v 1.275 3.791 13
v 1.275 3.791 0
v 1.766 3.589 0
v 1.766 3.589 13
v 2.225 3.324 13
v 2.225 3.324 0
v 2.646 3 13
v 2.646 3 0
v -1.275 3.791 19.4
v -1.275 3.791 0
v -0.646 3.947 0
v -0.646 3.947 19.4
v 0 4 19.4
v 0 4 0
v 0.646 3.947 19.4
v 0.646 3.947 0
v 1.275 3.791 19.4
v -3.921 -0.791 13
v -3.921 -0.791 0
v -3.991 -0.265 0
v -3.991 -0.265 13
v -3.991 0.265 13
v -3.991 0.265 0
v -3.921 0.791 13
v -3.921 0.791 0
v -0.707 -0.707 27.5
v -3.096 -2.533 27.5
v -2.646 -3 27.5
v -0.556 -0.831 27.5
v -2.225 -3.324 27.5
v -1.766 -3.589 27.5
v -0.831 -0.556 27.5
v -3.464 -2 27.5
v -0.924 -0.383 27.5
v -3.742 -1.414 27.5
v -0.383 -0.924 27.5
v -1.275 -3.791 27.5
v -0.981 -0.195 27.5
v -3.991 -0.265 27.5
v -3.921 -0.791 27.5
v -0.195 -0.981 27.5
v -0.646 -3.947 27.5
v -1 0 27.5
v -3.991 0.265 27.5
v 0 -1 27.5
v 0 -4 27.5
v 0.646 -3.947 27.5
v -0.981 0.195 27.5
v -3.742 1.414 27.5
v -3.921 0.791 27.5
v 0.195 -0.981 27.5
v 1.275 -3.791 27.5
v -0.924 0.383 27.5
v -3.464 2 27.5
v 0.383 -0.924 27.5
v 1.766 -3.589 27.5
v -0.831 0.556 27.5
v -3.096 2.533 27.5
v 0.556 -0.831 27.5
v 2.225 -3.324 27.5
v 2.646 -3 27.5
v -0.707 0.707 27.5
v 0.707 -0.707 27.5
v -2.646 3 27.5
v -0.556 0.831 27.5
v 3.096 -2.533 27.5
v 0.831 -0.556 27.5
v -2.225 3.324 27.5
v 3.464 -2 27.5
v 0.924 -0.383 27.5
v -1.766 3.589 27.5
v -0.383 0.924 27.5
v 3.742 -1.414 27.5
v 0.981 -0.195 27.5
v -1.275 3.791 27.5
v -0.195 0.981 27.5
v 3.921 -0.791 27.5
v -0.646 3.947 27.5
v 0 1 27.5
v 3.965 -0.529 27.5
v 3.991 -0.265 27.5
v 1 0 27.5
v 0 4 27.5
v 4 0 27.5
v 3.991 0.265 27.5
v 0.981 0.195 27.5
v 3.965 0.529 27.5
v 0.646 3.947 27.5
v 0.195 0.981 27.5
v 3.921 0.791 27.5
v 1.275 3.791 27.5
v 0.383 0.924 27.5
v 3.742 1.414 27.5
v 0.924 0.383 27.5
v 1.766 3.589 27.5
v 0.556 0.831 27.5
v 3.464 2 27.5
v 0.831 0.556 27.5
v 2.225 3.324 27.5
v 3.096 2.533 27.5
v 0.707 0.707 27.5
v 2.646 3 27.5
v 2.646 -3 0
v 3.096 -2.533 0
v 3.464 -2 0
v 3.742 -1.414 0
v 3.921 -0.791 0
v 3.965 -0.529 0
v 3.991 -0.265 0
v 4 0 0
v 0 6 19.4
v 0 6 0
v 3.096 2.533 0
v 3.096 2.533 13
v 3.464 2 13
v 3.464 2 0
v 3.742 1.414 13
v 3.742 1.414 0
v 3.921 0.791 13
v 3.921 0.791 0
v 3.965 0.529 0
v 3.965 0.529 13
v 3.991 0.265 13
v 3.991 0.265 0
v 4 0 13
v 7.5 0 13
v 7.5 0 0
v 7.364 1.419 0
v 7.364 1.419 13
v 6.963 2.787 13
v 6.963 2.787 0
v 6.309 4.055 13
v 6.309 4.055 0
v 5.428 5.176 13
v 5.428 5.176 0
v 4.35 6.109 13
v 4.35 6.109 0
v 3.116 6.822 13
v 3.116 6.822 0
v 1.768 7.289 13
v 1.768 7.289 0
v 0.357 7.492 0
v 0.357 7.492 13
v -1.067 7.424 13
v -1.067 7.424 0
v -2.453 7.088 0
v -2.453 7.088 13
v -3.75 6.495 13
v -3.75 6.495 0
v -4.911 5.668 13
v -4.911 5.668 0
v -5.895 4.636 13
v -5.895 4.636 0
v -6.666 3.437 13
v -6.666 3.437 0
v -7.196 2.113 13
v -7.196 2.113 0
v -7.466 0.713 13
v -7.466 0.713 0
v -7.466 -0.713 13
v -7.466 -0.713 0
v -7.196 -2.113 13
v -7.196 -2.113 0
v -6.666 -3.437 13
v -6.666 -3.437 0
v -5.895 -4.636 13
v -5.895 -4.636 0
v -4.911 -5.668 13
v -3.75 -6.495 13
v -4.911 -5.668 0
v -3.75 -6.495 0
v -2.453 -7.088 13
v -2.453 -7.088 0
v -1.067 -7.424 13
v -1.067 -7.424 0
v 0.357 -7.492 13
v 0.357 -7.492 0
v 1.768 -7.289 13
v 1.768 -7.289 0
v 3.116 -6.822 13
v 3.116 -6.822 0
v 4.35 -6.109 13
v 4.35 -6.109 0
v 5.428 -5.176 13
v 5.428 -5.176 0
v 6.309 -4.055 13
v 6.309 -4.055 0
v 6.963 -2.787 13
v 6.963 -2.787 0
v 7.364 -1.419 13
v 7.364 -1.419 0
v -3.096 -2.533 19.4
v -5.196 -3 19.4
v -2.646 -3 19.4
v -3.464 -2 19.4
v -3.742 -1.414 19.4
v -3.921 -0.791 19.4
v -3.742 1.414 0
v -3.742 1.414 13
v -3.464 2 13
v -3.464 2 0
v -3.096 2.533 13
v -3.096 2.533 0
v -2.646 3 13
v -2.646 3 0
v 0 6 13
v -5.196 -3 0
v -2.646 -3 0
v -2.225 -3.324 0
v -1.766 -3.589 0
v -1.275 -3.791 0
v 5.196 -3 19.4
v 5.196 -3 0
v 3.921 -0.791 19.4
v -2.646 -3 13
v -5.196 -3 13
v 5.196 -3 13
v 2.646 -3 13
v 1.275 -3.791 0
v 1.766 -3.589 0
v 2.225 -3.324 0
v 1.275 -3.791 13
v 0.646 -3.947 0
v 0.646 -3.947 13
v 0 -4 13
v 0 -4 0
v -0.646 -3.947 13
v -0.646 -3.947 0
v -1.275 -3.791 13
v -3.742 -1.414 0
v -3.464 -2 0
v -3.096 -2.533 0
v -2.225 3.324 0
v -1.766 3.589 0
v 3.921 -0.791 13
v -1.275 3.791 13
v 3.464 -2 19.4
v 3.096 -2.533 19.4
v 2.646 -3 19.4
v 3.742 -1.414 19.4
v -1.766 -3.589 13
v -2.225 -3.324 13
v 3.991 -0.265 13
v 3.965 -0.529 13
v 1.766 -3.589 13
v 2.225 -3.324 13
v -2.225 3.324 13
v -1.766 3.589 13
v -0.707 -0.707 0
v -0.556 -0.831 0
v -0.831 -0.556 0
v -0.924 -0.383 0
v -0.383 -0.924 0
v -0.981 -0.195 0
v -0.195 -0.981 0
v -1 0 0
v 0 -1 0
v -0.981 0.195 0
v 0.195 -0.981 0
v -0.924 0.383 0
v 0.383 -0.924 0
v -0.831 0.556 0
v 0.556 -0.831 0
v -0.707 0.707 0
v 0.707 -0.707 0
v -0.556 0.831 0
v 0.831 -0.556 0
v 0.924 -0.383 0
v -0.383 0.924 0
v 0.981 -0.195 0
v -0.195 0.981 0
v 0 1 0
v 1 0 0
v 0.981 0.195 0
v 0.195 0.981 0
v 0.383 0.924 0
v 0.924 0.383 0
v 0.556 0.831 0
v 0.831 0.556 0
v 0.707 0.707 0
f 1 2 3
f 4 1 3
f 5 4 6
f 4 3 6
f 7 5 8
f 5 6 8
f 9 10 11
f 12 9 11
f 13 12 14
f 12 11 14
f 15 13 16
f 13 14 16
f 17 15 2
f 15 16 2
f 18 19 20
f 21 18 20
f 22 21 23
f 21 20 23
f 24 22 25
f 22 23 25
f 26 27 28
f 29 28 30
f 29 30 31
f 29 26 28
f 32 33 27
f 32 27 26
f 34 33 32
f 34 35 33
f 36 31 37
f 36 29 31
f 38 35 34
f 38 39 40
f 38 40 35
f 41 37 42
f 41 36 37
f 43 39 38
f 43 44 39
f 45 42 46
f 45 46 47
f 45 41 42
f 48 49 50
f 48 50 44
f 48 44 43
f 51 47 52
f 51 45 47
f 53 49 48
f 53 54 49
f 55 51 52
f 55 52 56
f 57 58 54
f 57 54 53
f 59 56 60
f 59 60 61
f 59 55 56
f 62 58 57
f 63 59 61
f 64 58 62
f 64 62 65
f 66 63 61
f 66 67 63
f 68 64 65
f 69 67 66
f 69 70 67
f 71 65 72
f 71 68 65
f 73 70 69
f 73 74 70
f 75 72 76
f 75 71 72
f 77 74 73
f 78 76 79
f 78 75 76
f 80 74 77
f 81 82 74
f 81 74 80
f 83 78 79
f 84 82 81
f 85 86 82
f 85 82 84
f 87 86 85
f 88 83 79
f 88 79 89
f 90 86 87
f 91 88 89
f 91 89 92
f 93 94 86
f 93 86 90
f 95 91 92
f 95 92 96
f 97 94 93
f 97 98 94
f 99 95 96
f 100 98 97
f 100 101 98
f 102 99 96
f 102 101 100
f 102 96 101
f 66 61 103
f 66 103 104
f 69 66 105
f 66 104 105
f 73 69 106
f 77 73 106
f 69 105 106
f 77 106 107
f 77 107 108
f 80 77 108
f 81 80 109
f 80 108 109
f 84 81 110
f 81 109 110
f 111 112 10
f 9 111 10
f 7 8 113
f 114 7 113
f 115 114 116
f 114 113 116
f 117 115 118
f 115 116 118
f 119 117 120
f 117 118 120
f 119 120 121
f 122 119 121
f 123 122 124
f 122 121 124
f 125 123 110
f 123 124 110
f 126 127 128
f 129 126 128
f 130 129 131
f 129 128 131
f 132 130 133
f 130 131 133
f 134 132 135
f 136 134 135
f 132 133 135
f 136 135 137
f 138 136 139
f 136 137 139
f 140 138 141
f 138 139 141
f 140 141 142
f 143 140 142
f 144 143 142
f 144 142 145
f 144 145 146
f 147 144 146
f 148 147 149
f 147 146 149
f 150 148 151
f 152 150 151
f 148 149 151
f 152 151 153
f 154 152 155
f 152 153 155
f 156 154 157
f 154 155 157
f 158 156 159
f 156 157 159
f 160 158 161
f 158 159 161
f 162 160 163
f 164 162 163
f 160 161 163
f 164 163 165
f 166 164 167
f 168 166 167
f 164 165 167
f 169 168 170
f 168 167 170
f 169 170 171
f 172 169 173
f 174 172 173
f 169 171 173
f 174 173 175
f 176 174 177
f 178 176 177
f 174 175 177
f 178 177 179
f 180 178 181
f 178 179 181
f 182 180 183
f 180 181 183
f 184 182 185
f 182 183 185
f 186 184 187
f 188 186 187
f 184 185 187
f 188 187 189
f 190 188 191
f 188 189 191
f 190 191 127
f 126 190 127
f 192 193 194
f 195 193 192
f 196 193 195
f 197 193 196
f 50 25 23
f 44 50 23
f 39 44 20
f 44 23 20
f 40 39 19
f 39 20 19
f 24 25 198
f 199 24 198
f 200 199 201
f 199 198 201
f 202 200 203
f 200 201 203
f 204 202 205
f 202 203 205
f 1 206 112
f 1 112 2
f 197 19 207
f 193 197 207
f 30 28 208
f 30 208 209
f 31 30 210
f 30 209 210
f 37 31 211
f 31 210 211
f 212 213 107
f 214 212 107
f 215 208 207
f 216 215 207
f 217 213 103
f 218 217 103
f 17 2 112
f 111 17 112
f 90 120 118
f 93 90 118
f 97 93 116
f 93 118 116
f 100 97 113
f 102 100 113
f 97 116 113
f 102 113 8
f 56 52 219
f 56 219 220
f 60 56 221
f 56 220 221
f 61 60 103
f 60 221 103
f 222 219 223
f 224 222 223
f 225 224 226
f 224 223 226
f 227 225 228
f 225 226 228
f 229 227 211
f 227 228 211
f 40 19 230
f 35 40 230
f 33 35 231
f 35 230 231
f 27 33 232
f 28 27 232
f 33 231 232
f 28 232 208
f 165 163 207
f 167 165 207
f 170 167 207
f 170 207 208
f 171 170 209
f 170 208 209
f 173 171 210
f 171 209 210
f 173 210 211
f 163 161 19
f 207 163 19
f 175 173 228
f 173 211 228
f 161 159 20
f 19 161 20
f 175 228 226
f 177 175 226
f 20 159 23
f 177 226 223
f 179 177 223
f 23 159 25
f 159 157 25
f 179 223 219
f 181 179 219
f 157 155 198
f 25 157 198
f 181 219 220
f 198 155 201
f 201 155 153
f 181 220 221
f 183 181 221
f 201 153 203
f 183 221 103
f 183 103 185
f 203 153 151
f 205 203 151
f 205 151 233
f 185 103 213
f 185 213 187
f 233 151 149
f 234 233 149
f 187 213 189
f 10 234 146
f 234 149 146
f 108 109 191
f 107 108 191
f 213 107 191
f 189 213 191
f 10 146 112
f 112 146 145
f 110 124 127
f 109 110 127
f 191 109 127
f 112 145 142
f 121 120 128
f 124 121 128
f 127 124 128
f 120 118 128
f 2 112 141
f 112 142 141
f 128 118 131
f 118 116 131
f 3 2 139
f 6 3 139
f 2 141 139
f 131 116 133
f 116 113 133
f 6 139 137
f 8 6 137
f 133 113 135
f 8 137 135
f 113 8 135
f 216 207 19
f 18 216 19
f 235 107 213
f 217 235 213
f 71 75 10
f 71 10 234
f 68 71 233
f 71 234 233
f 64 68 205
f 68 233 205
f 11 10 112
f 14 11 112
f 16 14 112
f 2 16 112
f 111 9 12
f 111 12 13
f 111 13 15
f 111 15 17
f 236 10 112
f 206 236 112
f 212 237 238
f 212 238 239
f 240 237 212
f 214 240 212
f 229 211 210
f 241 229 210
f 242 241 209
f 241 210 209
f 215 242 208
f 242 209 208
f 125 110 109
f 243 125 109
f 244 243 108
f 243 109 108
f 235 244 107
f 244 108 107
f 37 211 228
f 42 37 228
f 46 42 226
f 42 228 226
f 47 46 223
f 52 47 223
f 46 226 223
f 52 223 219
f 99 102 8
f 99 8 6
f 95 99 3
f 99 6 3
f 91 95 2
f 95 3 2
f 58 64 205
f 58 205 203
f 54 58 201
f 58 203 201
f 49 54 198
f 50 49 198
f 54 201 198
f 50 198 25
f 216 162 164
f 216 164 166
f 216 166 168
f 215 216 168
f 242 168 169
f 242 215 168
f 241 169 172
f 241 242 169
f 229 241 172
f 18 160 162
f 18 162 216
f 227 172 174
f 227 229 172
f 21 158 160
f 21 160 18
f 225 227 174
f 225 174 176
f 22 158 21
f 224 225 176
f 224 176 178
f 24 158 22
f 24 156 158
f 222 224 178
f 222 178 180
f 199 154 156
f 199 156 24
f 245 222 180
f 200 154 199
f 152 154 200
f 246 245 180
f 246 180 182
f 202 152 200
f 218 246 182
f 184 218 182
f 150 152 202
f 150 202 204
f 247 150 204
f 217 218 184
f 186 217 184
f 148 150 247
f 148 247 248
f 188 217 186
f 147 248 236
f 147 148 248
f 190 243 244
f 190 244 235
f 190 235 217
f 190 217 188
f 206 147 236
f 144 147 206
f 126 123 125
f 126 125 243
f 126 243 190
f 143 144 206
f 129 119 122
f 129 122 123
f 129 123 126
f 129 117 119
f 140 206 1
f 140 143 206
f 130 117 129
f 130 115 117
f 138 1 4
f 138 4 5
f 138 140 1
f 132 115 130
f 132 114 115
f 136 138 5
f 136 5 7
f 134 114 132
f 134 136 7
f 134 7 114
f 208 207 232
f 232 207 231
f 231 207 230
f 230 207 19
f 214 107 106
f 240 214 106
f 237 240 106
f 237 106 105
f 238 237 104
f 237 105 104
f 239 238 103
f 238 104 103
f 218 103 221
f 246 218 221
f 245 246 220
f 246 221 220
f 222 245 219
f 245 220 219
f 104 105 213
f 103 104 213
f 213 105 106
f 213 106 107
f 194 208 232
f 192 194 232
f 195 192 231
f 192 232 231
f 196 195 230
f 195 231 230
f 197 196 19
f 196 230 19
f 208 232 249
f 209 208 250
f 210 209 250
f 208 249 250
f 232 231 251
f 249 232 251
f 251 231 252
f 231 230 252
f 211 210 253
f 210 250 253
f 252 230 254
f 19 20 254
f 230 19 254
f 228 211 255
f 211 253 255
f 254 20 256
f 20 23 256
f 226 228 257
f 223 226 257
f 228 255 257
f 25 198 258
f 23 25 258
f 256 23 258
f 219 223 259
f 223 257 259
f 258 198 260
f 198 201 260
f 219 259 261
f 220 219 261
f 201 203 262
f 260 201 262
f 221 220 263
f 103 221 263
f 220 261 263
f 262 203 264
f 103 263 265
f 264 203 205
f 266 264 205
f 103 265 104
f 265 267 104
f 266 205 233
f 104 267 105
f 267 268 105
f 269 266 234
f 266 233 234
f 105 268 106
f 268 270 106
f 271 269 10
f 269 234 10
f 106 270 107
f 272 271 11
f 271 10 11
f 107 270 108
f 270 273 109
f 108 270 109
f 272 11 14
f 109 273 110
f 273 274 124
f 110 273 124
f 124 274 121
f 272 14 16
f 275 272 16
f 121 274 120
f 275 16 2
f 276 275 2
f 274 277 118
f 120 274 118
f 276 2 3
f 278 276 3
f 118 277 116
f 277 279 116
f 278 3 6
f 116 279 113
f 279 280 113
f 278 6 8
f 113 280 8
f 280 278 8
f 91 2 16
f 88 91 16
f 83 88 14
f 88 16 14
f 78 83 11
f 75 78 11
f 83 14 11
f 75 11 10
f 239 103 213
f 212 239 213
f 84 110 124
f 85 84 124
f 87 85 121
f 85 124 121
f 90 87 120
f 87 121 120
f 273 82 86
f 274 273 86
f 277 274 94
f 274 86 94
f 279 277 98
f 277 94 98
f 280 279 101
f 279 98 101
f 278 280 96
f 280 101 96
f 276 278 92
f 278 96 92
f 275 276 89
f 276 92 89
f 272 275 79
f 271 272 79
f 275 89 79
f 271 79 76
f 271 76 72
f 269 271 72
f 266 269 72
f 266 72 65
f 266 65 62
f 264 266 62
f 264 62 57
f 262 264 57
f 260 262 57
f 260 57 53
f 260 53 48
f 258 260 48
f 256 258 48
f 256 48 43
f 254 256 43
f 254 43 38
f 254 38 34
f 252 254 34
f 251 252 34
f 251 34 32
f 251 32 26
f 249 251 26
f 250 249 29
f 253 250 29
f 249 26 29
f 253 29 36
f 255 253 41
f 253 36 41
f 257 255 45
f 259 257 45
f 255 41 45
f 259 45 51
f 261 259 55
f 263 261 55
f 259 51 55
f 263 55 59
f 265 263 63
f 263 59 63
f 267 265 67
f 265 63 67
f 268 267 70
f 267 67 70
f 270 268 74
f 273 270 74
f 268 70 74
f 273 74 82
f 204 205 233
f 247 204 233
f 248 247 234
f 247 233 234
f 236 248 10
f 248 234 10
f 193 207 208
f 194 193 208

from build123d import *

# Parameters (mm, degrees)
F1_DEPTH = 19.4
F2_DEPTH = 27.5
F0_R     = 7.5
F3_DEPTH = 13
F4_R     = 1
F5_DEPTH = 30


with BuildPart() as f1:
    # F0 (on Top) → F1 (new body)
    with BuildSketch(Plane.XY):
        with BuildLine():
            Line((5.1961524227, -3), (3.9209518669, -0.7912878475))
            ThreePointArc((3.9209518669, -0.7912878475), (3.4641016151, -2), (2.6457513111, -3))
            Line((2.6457513111, -3), (5.1961524227, -3))
        make_face()
    extrude(amount=F1_DEPTH)


with BuildPart() as f1b:
    # F0 (on Top) → F1, piece 2 (new body)
    with BuildSketch(Plane.XY):
        with BuildLine():
            Line((-5.1961524227, -3), (-2.6457513111, -3))
            ThreePointArc((-2.6457513111, -3), (-3.4641016151, -2), (-3.9209518669, -0.7912878475))
            Line((-3.9209518669, -0.7912878475), (-5.1961524227, -3))
        make_face()
    extrude(amount=F1_DEPTH)


with BuildPart() as f1c:
    # F0 (on Top) → F1, piece 3 (new body)
    with BuildSketch(Plane.XY):
        with BuildLine():
            ThreePointArc((-1.2752005558, 3.7912878475), (0, 4), (1.2752005558, 3.7912878475))
            Line((1.2752005558, 3.7912878475), (0, 6))
            Line((0, 6), (-1.2752005558, 3.7912878475))
        make_face()
    extrude(amount=F1_DEPTH)


with BuildPart() as f2:
    # F0 (on Top) → F2 (new body)
    with BuildSketch(Plane.XY):
        with BuildLine():
            Line((-3.4641016151, 0), (-1.7320508076, 3))
            Line((-1.7320508076, 3), (-2.6457513111, 3))
            ThreePointArc((-2.6457513111, 3), (-3.4641016151, 2), (-3.9209518669, 0.7912878475))
            Line((-3.9209518669, 0.7912878475), (-3.4641016151, 0))
        make_face()
        with BuildLine():
            Line((-1.7320508076, 3), (-1.2752005558, 3.7912878475))
            ThreePointArc((-1.2752005558, 3.7912878475), (-2, 3.4641016151), (-2.6457513111, 3))
            Line((-2.6457513111, 3), (-1.7320508076, 3))
        make_face()
        with BuildLine():
            Line((1.7320508076, 3), (1.2752005558, 3.7912878475))
            ThreePointArc((1.2752005558, 3.7912878475), (0, 4), (-1.2752005558, 3.7912878475))
            Line((-1.2752005558, 3.7912878475), (-1.7320508076, 3))
            Line((-1.7320508076, 3), (1.7320508076, 3))
        make_face()
        with BuildLine():
            Line((1.7320508076, 3), (2.6457513111, 3))
            ThreePointArc((2.6457513111, 3), (2, 3.4641016151), (1.2752005558, 3.7912878475))
            Line((1.2752005558, 3.7912878475), (1.7320508076, 3))
        make_face()
        with BuildLine():
            Line((3.4641016151, 0), (3.9209518669, 0.7912878475))
            ThreePointArc((3.9209518669, 0.7912878475), (3.4641016151, 2), (2.6457513111, 3))
            Line((2.6457513111, 3), (1.7320508076, 3))
            Line((1.7320508076, 3), (3.4641016151, 0))
        make_face()
        with BuildLine():
            ThreePointArc((3.9209518669, -0.7912878475), (3.9801889068, -0.3976132118), (4, 0))
            ThreePointArc((4, 0), (3.9801889068, 0.3976132118), (3.9209518669, 0.7912878475))
            Line((3.9209518669, 0.7912878475), (3.4641016151, 0))
            Line((3.4641016151, 0), (3.9209518669, -0.7912878475))
        make_face()
        with BuildLine():
            ThreePointArc((2.6457513111, -3), (3.4641016151, -2), (3.9209518669, -0.7912878475))
            Line((3.9209518669, -0.7912878475), (3.4641016151, 0))
            Line((3.4641016151, 0), (1.7320508076, -3))
            Line((1.7320508076, -3), (2.6457513111, -3))
        make_face()
        with BuildLine():
            Line((1.2752005558, -3.7912878475), (1.7320508076, -3))
            Line((1.7320508076, -3), (-1.7320508076, -3))
            Line((-1.7320508076, -3), (-1.2752005558, -3.7912878475))
            ThreePointArc((-1.2752005558, -3.7912878475), (0, -4), (1.2752005558, -3.7912878475))
        make_face()
        with BuildLine():
            Line((-1.2752005558, -3.7912878475), (-1.7320508076, -3))
            Line((-1.7320508076, -3), (-2.6457513111, -3))
            ThreePointArc((-2.6457513111, -3), (-2, -3.4641016151), (-1.2752005558, -3.7912878475))
        make_face()
        with BuildLine():
            Line((-2.6457513111, -3), (-1.7320508076, -3))
            Line((-1.7320508076, -3), (-3.4641016151, 0))
            Line((-3.4641016151, 0), (-3.9209518669, -0.7912878475))
            ThreePointArc((-3.9209518669, -0.7912878475), (-3.4641016151, -2), (-2.6457513111, -3))
        make_face()
        with BuildLine():
            Line((-3.9209518669, -0.7912878475), (-3.4641016151, 0))
            Line((-3.4641016151, 0), (-3.9209518669, 0.7912878475))
            ThreePointArc((-3.9209518669, 0.7912878475), (-4, 0), (-3.9209518669, -0.7912878475))
        make_face()
        Polygon((1.7320508076, -3), (3.4641016151, 0), (1.7320508076, 3), (-1.7320508076, 3), (-3.4641016151, 0), (-1.7320508076, -3), align=None)
        with BuildLine():
            ThreePointArc((1.2752005558, -3.7912878475), (2, -3.4641016151), (2.6457513111, -3))
            Line((2.6457513111, -3), (1.7320508076, -3))
            Line((1.7320508076, -3), (1.2752005558, -3.7912878475))
        make_face()
    extrude(amount=F2_DEPTH)

    # F4 (on face) → F5 (cut)
    with BuildSketch(Plane.XY.offset(27.5)):
        Circle(F4_R)
    extrude(amount=-F5_DEPTH, mode=Mode.SUBTRACT)


with BuildPart() as f3:
    # F0 (on Top) → F3 (new body)
    with BuildSketch(Plane.XY):
        Circle(F0_R)
        with BuildLine():
            ThreePointArc((3.9209518669, 0.7912878475), (3.9801889068, 0.3976132118), (4, 0))
            ThreePointArc((4, 0), (3.9801889068, -0.3976132118), (3.9209518669, -0.7912878475))
            Line((3.9209518669, -0.7912878475), (5.1961524227, -3))
            Line((5.1961524227, -3), (2.6457513111, -3))
            ThreePointArc((2.6457513111, -3), (2, -3.4641016151), (1.2752005558, -3.7912878475))
            Line((1.2752005558, -3.7912878475), (0, -6))
            Line((0, -6), (-1.2752005558, -3.7912878475))
            ThreePointArc((-1.2752005558, -3.7912878475), (-2, -3.4641016151), (-2.6457513111, -3))
            Line((-2.6457513111, -3), (-5.1961524227, -3))
            Line((-5.1961524227, -3), (-3.9209518669, -0.7912878475))
            ThreePointArc((-3.9209518669, -0.7912878475), (-4, 0), (-3.9209518669, 0.7912878475))
            Line((-3.9209518669, 0.7912878475), (-5.1961524227, 3))
            Line((-5.1961524227, 3), (-2.6457513111, 3))
            ThreePointArc((-2.6457513111, 3), (-2, 3.4641016151), (-1.2752005558, 3.7912878475))
            Line((-1.2752005558, 3.7912878475), (0, 6))
            Line((0, 6), (1.2752005558, 3.7912878475))
            ThreePointArc((1.2752005558, 3.7912878475), (2, 3.4641016151), (2.6457513111, 3))
            Line((2.6457513111, 3), (5.1961524227, 3))
            Line((5.1961524227, 3), (3.9209518669, 0.7912878475))
        make_face(mode=Mode.SUBTRACT)
        with BuildLine():
            ThreePointArc((-3.9209518669, 0.7912878475), (-3.4641016151, 2), (-2.6457513111, 3))
            Line((-2.6457513111, 3), (-5.1961524227, 3))
            Line((-5.1961524227, 3), (-3.9209518669, 0.7912878475))
        make_face()
        with BuildLine():
            ThreePointArc((2.6457513111, 3), (3.4641016151, 2), (3.9209518669, 0.7912878475))
            Line((3.9209518669, 0.7912878475), (5.1961524227, 3))
            Line((5.1961524227, 3), (2.6457513111, 3))
        make_face()
        with BuildLine():
            Line((0, -6), (1.2752005558, -3.7912878475))
            ThreePointArc((1.2752005558, -3.7912878475), (0, -4), (-1.2752005558, -3.7912878475))
            Line((-1.2752005558, -3.7912878475), (0, -6))
        make_face()
    extrude(amount=F3_DEPTH)


solid = Compound([f1.part, f1b.part, f1c.part, f2.part, f3.part])
